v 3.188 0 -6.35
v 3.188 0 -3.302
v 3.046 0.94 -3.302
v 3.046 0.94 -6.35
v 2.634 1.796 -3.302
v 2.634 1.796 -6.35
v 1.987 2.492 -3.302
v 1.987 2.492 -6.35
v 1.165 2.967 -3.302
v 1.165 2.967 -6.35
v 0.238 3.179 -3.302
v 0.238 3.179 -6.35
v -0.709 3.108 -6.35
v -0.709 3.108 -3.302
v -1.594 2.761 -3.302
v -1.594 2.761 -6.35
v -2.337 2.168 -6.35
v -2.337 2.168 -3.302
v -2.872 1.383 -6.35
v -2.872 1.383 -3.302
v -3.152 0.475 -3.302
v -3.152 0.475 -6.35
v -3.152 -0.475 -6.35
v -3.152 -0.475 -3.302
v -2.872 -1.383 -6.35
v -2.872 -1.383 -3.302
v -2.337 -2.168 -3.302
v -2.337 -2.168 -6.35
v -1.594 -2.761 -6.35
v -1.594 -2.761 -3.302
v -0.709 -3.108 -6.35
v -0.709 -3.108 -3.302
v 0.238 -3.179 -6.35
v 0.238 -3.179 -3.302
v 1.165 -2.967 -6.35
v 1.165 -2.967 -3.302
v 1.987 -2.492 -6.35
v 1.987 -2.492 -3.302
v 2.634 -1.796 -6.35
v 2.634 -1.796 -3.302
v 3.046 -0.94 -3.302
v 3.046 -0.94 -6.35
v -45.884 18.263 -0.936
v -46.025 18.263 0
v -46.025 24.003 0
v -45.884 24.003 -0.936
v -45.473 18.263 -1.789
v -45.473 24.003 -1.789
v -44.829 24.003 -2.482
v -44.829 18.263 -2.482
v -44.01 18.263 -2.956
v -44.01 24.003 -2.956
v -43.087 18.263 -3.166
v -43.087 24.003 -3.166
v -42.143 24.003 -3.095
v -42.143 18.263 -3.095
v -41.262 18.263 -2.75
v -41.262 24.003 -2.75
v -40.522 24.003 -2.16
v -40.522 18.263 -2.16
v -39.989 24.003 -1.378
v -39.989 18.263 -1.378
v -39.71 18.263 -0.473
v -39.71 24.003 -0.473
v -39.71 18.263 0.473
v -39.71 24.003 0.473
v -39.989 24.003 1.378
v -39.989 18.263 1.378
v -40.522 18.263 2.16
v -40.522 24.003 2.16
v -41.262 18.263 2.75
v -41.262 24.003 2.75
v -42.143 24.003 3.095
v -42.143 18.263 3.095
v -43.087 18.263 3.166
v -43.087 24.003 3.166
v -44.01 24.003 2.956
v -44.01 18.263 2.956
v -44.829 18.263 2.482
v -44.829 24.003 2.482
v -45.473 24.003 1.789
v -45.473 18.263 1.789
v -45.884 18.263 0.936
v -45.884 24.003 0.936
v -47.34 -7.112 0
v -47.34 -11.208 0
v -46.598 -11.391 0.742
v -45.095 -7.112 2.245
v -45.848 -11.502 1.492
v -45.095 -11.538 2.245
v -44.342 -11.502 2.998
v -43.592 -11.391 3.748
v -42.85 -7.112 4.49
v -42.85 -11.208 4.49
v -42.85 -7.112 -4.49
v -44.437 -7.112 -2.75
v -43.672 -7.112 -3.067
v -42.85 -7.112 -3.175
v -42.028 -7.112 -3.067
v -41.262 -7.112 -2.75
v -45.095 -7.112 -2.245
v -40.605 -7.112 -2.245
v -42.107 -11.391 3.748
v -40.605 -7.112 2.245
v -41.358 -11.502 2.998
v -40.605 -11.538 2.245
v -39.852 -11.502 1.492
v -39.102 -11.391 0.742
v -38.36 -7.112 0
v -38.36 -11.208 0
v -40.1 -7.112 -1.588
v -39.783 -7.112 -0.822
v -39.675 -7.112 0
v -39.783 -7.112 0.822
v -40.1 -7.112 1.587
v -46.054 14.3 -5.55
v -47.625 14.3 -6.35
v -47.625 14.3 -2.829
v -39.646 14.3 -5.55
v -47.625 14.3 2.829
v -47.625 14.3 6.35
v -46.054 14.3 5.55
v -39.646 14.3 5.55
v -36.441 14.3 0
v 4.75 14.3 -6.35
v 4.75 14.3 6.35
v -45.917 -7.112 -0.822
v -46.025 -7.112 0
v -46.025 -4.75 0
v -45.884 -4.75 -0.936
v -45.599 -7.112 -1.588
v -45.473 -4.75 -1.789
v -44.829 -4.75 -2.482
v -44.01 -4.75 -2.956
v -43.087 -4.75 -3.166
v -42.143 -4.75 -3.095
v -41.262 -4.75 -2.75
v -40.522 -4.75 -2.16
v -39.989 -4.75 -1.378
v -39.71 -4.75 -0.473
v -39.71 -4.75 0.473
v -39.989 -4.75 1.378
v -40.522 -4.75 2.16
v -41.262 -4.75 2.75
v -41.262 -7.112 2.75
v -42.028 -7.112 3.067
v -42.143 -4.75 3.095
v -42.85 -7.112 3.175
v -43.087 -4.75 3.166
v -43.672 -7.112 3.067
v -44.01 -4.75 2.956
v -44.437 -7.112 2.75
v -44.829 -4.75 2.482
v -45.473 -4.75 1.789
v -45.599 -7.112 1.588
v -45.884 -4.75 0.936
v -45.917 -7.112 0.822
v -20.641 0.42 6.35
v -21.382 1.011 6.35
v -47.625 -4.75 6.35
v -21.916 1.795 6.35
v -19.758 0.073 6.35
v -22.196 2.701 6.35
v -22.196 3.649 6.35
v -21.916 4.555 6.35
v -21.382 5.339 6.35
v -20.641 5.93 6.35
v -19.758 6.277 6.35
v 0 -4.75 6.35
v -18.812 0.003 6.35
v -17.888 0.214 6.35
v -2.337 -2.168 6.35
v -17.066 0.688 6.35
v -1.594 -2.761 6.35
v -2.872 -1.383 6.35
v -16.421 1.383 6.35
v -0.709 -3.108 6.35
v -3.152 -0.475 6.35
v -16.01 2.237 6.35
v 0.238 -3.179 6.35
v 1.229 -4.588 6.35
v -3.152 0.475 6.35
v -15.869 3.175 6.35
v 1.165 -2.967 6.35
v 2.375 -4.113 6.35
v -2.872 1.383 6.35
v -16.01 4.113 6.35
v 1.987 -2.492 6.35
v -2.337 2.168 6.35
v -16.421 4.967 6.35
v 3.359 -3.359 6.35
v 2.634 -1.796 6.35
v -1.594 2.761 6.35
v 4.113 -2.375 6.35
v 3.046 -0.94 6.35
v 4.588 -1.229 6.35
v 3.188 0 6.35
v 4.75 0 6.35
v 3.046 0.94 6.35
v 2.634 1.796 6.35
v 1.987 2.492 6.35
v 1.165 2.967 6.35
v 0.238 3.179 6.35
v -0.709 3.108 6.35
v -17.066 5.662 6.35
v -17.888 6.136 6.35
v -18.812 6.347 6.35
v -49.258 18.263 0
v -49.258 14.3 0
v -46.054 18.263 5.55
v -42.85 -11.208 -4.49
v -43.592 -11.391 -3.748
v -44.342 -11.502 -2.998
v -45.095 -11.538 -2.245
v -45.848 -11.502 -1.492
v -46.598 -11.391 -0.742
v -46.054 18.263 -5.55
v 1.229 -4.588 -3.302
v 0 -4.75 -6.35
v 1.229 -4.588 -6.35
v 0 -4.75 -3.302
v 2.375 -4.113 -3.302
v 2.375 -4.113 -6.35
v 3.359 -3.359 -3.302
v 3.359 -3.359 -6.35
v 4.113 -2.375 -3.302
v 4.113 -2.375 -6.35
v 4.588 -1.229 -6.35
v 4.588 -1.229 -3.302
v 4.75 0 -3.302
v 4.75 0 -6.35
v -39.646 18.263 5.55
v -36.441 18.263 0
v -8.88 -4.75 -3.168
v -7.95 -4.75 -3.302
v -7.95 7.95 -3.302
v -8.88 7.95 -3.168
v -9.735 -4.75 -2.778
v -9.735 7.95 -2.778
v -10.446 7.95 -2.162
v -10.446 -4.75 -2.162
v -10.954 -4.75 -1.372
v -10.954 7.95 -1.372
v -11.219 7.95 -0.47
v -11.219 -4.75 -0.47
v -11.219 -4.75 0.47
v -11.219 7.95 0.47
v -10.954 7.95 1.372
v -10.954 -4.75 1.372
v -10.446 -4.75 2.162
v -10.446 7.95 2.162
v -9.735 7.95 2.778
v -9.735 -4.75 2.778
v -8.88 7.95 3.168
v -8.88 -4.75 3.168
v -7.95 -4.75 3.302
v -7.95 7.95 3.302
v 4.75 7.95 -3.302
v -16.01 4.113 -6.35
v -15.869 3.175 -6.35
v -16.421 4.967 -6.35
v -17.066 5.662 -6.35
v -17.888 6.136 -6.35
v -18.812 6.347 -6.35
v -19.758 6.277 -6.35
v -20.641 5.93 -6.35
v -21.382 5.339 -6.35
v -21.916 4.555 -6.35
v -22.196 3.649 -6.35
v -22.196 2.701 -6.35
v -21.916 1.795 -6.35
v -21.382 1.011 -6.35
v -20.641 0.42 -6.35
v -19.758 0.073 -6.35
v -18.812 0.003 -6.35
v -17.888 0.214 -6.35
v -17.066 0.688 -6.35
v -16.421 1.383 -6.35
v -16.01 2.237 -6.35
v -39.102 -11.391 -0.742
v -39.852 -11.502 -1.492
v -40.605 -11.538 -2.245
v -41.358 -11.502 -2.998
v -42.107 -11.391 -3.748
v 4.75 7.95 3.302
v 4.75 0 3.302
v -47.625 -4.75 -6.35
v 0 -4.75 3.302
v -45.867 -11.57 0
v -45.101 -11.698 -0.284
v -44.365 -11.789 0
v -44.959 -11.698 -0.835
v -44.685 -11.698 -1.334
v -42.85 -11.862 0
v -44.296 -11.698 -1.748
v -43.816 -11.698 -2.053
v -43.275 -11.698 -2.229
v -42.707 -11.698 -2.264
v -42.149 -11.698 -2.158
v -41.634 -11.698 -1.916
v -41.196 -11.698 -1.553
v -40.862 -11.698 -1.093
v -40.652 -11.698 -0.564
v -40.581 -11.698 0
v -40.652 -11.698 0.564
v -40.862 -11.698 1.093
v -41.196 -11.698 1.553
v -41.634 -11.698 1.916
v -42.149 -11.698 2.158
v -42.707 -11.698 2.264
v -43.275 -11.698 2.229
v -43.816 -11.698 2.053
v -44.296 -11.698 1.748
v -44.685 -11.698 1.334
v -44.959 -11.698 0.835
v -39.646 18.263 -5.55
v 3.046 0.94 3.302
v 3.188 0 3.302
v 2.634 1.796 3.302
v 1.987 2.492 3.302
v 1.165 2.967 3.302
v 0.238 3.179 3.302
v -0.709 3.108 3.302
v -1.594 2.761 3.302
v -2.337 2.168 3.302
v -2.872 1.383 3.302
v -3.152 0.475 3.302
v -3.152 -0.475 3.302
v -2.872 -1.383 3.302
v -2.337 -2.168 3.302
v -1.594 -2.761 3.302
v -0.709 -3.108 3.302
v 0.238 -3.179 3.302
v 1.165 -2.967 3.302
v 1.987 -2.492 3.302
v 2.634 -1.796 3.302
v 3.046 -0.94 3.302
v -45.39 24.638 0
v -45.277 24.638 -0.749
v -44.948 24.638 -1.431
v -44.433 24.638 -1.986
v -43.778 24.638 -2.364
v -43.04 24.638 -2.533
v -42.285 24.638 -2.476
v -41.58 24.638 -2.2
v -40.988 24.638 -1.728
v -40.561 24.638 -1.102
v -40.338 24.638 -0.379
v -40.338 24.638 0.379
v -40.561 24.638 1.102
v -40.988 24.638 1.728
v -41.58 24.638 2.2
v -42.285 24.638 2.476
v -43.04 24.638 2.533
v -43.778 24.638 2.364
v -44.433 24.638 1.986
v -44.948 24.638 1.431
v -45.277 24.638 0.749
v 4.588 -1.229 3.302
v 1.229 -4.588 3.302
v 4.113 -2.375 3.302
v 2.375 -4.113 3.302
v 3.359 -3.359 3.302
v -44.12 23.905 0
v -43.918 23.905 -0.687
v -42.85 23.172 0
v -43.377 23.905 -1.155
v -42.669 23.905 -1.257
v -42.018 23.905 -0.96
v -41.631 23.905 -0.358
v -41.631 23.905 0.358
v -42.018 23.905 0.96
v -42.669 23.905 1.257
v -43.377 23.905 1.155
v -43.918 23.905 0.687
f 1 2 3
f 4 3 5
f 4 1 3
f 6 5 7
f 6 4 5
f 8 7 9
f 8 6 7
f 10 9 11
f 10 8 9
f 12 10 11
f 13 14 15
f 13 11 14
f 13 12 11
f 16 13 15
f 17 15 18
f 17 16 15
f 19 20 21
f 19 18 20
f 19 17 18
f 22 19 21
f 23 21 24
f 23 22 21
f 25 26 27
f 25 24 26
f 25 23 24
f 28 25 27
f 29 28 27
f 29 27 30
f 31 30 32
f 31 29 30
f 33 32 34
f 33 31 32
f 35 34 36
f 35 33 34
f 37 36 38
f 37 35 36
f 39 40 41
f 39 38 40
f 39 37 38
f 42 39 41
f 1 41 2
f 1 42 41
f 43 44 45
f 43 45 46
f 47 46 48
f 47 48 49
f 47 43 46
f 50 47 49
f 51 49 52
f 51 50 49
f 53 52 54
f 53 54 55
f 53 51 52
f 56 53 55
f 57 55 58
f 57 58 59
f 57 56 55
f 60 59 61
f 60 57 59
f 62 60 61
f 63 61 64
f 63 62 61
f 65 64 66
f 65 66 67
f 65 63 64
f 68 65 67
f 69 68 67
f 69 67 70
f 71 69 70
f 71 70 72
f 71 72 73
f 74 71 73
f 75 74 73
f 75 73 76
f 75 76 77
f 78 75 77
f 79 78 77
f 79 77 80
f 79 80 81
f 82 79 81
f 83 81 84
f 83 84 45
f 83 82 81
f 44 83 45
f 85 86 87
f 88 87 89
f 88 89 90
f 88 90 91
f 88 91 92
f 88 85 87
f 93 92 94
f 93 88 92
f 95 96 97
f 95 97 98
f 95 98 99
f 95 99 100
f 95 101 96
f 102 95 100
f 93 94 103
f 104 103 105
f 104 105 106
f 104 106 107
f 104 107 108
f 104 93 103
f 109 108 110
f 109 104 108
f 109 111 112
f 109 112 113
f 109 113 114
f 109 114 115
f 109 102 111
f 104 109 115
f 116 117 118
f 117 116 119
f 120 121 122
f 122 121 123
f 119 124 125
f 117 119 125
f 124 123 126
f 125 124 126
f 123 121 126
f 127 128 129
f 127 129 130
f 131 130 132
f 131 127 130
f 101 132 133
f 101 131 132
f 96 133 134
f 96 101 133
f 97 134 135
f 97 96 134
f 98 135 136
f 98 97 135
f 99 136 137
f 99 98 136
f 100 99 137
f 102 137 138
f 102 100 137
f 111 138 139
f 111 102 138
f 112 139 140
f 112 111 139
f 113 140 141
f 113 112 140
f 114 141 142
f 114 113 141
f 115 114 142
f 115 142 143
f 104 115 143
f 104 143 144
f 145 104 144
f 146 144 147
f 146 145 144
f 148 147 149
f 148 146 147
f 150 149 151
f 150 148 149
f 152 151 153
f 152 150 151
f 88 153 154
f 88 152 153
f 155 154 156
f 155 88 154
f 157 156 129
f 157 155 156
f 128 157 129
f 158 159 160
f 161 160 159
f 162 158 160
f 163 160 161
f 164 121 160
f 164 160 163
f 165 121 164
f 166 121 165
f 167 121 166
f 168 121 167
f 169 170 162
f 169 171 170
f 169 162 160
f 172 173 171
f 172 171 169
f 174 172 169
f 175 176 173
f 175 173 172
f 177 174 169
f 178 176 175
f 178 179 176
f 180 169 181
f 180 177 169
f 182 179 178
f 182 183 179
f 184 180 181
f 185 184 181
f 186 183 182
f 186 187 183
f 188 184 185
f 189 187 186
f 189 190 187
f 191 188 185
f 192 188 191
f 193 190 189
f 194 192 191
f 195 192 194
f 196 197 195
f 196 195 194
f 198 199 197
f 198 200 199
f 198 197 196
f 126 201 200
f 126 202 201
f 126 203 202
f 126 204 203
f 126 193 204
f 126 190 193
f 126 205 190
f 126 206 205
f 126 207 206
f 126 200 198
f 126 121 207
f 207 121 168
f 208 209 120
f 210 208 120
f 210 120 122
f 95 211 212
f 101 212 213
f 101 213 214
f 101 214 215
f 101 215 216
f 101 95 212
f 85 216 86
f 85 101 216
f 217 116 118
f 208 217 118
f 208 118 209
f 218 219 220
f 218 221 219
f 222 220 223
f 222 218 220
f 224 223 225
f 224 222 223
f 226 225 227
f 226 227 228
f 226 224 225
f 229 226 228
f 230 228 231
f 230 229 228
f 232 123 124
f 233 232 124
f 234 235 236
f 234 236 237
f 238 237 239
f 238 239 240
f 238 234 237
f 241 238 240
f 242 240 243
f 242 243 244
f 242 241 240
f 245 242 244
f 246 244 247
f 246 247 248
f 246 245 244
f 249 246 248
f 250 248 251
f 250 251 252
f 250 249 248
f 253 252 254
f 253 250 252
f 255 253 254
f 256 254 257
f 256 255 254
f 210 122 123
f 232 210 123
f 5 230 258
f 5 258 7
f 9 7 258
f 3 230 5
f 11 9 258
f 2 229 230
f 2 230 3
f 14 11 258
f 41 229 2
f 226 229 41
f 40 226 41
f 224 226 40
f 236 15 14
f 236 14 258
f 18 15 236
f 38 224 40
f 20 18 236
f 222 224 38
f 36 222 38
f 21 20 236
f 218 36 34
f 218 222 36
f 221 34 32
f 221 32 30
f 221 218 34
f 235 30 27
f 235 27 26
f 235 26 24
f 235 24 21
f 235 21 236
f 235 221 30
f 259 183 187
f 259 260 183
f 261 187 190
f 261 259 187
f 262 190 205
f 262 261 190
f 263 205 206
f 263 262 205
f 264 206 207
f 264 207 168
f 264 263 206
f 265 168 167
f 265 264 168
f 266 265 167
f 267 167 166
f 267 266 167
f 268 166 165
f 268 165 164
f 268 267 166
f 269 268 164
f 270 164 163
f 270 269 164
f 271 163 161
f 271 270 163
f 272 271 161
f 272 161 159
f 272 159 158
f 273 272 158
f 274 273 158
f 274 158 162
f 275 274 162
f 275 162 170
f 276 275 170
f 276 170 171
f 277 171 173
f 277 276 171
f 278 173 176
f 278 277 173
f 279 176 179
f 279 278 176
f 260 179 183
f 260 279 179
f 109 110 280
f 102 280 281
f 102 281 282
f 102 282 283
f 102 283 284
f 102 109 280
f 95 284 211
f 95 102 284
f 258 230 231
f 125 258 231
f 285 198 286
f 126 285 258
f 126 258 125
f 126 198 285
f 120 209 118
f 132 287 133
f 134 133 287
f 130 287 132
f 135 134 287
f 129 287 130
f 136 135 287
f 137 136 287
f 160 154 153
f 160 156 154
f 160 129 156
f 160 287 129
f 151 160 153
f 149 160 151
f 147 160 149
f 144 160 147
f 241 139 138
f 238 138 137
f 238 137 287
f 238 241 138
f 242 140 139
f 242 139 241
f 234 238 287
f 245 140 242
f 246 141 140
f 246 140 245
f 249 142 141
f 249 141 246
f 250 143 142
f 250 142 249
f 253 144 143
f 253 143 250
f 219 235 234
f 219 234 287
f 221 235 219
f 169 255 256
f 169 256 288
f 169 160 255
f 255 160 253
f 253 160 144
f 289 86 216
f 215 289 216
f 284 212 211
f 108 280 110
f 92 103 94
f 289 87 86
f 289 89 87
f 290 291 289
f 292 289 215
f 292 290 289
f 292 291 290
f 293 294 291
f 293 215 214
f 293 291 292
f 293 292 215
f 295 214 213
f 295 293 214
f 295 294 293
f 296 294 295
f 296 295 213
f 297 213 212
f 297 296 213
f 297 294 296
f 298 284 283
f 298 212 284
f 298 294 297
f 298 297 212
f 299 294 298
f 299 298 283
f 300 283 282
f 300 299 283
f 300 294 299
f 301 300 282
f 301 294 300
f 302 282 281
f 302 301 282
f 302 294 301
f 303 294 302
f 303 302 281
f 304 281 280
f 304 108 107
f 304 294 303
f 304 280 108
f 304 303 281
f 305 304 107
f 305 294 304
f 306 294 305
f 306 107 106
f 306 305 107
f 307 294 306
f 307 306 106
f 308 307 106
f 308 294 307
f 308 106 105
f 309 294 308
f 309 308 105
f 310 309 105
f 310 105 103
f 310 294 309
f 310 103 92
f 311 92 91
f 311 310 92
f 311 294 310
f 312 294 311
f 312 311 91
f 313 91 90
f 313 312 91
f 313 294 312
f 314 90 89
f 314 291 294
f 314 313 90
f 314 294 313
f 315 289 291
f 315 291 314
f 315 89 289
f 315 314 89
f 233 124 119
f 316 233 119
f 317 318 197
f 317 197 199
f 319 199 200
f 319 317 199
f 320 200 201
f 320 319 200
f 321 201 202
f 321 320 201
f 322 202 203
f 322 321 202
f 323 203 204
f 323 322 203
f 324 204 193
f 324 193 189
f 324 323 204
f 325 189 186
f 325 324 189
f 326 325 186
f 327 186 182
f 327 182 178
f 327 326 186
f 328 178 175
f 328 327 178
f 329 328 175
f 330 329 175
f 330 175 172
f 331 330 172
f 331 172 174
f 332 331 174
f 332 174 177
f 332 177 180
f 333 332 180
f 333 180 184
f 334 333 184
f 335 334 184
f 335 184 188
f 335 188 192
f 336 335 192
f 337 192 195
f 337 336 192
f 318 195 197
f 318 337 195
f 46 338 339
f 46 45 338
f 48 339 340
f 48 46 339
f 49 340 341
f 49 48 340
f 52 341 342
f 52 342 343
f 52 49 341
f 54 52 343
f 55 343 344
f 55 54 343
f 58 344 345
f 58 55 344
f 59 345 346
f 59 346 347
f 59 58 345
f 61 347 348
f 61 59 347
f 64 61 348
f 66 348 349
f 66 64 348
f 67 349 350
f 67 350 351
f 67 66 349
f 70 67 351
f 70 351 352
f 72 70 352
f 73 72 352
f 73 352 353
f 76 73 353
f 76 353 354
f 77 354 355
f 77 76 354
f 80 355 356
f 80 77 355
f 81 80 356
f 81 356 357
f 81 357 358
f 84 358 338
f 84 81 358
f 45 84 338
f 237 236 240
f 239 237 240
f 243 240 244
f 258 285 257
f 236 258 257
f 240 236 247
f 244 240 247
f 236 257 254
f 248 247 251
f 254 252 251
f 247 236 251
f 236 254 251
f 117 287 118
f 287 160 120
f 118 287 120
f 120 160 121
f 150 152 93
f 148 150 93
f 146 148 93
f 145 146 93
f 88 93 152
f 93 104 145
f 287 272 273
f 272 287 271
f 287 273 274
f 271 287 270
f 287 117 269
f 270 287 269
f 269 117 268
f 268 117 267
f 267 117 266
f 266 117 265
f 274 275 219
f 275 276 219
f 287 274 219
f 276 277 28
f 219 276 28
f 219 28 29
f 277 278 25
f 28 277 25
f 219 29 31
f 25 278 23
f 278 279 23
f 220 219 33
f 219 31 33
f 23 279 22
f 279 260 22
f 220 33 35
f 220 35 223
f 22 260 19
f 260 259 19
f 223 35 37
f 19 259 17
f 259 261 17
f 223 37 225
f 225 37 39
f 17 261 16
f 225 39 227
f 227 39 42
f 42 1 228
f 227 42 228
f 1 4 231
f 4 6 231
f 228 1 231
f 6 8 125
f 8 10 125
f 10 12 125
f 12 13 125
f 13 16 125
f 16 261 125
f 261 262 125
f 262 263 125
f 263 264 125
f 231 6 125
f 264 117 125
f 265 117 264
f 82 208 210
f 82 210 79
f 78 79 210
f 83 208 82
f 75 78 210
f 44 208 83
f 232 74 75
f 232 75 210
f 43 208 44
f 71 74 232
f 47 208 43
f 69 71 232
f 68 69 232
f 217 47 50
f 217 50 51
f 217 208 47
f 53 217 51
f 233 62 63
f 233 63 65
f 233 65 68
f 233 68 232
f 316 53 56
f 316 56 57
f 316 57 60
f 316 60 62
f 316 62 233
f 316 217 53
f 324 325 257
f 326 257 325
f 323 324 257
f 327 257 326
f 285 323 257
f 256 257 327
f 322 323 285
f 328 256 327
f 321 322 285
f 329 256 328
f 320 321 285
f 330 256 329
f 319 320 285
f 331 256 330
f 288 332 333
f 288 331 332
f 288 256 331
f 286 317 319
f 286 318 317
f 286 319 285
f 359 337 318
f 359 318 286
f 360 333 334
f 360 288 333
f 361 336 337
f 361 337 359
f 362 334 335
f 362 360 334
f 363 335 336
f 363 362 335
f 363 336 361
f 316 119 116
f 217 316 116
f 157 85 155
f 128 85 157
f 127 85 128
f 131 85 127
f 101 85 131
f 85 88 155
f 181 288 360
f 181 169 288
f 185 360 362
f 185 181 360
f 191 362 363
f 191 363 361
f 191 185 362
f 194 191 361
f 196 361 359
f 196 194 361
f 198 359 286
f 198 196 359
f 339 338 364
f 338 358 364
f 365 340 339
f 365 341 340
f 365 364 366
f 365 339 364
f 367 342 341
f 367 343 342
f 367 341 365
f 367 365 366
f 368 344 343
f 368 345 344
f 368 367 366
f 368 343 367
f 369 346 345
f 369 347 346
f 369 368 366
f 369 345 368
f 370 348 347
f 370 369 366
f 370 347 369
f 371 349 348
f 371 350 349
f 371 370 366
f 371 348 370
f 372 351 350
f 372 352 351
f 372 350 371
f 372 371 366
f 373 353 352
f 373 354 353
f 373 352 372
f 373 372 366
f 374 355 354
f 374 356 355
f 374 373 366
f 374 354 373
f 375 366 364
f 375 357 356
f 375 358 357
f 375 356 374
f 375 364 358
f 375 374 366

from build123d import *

# Parameters (mm, degrees)
SKETCH11_W         = 52.3748
SKETCH11_H         = 19.05
SKETCH11_R         = 3.1877
SKETCH11_R_2       = 3.18135
EXTRUDE3_DEPTH     = 6.35
CUT_EXTRUDE1_DEPTH = 12.7
FILLET1_R          = 4.7498
EXTRUDE4_DEPTH     = 3.9624
SKETCH15_R         = 10.473643108
CUT_EXTRUDE2_DEPTH = 5.7498


with BuildPart() as part:
    # Sketch11 → Extrude3 (new body, symmetric)
    with BuildSketch(Plane.XY):
        with Locations((-21.4376, 4.7752)):
            Rectangle(SKETCH11_W, SKETCH11_H)
        Circle(SKETCH11_R, mode=Mode.SUBTRACT)
        with Locations((-19.05, 3.175)):
            Circle(SKETCH11_R_2, mode=Mode.SUBTRACT)
    extrude(amount=EXTRUDE3_DEPTH, both=True)

    # Sketch12 → Cut-Extrude1 (cut)
    with BuildSketch(Plane.XZ.offset(4.7498)):
        with BuildLine():
            Line((-7.9502, 3.302), (4.7498, 3.302))
            Line((4.7498, 3.302), (4.7498, -3.302))
            Line((4.7498, -3.302), (-7.9502, -3.302))
            ThreePointArc((-7.9502, -3.302), (-11.2522, 0), (-7.9502, 3.302))
        make_face()
    extrude(amount=-CUT_EXTRUDE1_DEPTH, mode=Mode.SUBTRACT)

    # Fillet1
    fillet1_edges = [part.edges().sort_by_distance(p)[0] for p in [
        (4.7498, -4.7498, -4.826),
        (4.7498, -4.7498, 4.826),
    ]]
    fillet(fillet1_edges, radius=FILLET1_R)

    # Sketch13 → Extrude4 (add)
    with BuildSketch(Plane(origin=(0, 14.3002, 0), x_dir=(1, 0, 0), z_dir=(0, 1, 0))):
        Polygon((-36.441327482, 0), (-39.645563741, 5.5499), (-46.054036259, 5.5499), (-49.258272518, 0), (-46.054036259, -5.5499), (-39.645563741, -5.5499), align=None)
    extrude(amount=EXTRUDE4_DEPTH)

    # Sketch14 → Revolve2 (revolve)
    with BuildSketch(Plane.XY):
        with BuildLine():
            Line((-42.8498, 23.171530316), (-45.3898, 24.638))
            Line((-45.3898, 24.638), (-46.0248, 24.003))
            Line((-46.0248, 24.003), (-46.0248, -7.112))
            Line((-46.0248, -7.112), (-53.323443108, -7.112))
            Line((-53.323443108, -7.112), (-53.323443108, -7.874))
            ThreePointArc((-53.323443108, -7.874), (-48.453364687, -10.831121998), (-42.8498, -11.8618))
            Line((-42.8498, -11.8618), (-42.8498, 23.171530316))
        make_face()
    revolve(axis=Axis((-42.8498, 26.585218564, 0), (0, -1, 0)))

    # Sketch15 → Cut-Extrude2 (cut, through all)
    with BuildSketch(Plane(origin=(0, -7.112, 0), x_dir=(1, 0, 0), z_dir=(0, 1, 0))):
        with Locations((-42.8498, 0)):
            Circle(SKETCH15_R)
        Polygon((-42.8498, 4.490128061), (-47.339928061, 0), (-42.8498, -4.490128061), (-38.359671939, 0), align=None, mode=Mode.SUBTRACT)
    extrude(amount=-CUT_EXTRUDE2_DEPTH, mode=Mode.SUBTRACT)


solid = part.part
